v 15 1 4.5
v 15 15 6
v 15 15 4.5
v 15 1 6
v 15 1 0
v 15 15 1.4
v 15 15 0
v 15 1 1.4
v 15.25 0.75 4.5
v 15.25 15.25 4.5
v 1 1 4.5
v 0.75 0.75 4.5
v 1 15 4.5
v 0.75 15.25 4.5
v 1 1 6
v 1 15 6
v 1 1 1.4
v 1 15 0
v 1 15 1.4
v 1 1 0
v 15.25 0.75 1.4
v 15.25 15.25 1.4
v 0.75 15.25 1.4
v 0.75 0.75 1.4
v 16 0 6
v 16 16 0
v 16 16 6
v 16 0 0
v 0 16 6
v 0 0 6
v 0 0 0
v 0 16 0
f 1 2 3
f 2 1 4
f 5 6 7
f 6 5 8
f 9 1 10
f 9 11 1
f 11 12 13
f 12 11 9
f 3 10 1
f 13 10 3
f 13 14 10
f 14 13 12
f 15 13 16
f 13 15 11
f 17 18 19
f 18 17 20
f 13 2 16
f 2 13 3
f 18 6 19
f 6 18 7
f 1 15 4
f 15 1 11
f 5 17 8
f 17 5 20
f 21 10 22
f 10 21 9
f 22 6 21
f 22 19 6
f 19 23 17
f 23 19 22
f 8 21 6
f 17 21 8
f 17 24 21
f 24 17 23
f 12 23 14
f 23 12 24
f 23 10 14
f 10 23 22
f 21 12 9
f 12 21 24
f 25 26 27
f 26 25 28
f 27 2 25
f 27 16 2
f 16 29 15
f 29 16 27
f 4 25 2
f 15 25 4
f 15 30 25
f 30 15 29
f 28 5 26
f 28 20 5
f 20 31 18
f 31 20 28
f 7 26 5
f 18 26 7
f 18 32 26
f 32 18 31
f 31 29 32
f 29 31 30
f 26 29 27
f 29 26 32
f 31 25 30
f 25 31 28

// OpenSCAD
// Outer cube dimensions
outer_x = 16;
outer_y = 16;
outer_z = 6;

// Hollowed top section dimensions (plate)
hollow_x = 14;
hollow_y = 14;
hollow_z = 1.5;

// Hollowed out mid section (body)
hollow_x_bod = 14.5;
hollow_y_bod = 14.5;
hollow_z_bod = 4.6 - hollow_z;

// Smooth Circles
$fn = 60;

module keycap() {
    // Build the model
    difference() {
        // Outer solid cube
        cube([outer_x, outer_y, outer_z]);
        keycap_hollow();
    }
}

module keycap_hollow() {
        // Hollowed out top section
    translate([
        (outer_x - hollow_x)/2,
        (outer_y - hollow_y)/2,
        outer_z - hollow_z
    ])
        cube([hollow_x, hollow_y, hollow_z], center=false);
    // Hollowed out bottom section
    translate([
        (outer_x - hollow_x_bod)/2,
        (outer_y - hollow_y_bod)/2,
        outer_z - hollow_z_bod - hollow_z
    ])
        cube([hollow_x_bod, hollow_y_bod, hollow_z_bod], center=false);
    
    // Mounting Holes
        translate([
        (outer_x)/2,
        (outer_y)/2,
        0
    ])
    union() {
       cylinder(3, d=4);
        //translate([4.75,0,0])
        translate([5,0,0])
        cylinder(3, d=2);
        //translate([-4.75,0,0])
        translate([-5,0,0])
        cylinder(3, d=2);
        // pin 1
        translate([-3.5,2.25,0])
        cylinder(3, d=2);
        // pin 2
        translate([2,5,0])
        cylinder(3, d=2);
}; 
translate([
        (outer_x - hollow_x)/2,
        (outer_y - hollow_y)/2,
        outer_z - hollow_z - 5
    ])
        cube([hollow_x, hollow_y, hollow_z+10], center=false);

}

keycap();

//keycap_hollow();
